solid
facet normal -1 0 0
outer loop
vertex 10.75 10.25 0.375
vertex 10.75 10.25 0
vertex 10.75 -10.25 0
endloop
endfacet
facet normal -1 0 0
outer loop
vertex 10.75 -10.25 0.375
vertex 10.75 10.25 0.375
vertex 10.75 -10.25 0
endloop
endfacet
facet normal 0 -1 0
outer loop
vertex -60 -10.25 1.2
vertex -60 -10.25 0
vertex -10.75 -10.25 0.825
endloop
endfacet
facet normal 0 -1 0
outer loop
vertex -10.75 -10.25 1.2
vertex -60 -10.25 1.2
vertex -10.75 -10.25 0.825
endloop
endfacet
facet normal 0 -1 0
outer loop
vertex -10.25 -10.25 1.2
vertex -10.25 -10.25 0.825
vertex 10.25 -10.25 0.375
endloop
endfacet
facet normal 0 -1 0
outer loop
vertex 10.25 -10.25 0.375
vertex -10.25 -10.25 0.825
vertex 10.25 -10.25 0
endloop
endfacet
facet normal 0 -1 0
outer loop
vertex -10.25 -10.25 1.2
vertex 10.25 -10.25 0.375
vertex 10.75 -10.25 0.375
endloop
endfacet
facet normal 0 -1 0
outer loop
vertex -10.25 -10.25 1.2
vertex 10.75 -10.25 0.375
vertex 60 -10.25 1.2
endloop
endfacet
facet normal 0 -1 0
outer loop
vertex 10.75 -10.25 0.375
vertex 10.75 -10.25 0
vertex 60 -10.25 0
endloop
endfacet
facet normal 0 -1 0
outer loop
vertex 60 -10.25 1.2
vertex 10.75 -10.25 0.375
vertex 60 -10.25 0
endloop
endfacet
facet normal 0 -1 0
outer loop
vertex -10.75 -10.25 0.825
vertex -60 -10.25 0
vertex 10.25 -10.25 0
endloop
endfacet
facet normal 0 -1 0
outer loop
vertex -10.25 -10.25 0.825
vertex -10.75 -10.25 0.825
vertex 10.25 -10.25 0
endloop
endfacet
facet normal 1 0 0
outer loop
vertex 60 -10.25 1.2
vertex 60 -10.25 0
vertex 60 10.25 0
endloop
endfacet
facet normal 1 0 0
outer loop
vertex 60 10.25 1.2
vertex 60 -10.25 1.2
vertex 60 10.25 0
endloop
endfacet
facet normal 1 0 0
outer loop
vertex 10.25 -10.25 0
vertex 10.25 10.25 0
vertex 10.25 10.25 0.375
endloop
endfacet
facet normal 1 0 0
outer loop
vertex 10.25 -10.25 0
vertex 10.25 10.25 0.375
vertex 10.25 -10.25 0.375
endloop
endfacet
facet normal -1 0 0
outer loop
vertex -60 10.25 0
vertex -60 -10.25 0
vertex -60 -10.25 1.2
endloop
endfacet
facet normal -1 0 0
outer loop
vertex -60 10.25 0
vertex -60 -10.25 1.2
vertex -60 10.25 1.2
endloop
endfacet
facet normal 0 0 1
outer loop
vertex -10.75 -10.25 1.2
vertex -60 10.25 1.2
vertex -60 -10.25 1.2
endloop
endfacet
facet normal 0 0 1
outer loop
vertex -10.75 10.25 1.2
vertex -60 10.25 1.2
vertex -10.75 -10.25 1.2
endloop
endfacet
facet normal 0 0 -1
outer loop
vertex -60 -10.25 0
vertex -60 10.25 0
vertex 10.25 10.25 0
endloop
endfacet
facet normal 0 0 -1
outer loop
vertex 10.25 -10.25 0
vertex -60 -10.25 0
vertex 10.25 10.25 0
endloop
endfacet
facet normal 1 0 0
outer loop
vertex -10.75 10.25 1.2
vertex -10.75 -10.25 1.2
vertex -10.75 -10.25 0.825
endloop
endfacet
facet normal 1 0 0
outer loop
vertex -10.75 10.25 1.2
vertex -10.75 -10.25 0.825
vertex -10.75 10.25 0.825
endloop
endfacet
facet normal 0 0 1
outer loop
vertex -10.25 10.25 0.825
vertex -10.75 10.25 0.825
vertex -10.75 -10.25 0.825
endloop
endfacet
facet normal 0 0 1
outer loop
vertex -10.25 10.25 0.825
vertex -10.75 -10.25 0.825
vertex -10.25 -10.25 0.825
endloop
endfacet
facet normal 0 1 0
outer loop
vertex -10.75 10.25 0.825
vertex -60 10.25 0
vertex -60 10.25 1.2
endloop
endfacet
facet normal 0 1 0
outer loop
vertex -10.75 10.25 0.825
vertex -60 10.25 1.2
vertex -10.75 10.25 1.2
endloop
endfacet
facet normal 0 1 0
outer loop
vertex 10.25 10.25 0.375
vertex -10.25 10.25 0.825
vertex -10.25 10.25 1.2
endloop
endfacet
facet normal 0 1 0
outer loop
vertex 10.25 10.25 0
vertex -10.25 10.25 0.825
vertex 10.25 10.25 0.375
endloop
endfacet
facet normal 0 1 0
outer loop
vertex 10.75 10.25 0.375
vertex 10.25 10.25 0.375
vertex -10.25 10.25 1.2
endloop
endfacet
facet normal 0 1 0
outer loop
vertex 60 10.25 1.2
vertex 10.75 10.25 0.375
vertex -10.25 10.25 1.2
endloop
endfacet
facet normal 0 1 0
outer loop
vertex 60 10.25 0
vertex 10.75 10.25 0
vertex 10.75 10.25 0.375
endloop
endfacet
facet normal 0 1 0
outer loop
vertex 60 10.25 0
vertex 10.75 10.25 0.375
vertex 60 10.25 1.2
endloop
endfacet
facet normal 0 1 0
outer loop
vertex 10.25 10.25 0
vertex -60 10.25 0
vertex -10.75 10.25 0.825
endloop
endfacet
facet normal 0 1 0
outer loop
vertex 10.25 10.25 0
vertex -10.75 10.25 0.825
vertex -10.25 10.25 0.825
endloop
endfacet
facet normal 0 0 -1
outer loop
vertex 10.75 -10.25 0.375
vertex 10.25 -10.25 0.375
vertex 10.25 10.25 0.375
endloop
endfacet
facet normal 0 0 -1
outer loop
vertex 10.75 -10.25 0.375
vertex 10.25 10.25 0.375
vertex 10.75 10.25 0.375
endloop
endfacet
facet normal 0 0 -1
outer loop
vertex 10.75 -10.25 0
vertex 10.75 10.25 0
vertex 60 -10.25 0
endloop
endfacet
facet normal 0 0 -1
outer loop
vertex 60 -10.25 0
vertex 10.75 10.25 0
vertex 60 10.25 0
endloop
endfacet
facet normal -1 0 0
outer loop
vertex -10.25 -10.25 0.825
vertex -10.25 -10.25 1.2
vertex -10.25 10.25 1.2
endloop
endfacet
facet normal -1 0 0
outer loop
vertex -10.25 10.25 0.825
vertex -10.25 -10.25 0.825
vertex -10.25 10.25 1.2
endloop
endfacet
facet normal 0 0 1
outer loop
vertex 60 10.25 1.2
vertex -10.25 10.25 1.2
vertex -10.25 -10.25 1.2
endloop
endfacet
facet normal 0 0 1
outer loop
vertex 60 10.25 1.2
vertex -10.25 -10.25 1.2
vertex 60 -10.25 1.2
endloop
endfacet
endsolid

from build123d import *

# Parameters (mm, degrees)
F0_W     = 120
F0_H     = 20.5
F1_DEPTH = 1.2
F2_W     = 0.5
F2_H     = 20.5
F3_DEPTH = 0.375
F4_W     = 0.5
F4_H     = 20.5
F5_DEPTH = 0.375


with BuildPart() as f1:
    # F0 (on Top) → F1 (new body)
    with BuildSketch(Plane.XY):
        Rectangle(F0_W, F0_H)
    extrude(amount=F1_DEPTH)

    # F2 (on face) → F3 (cut)
    with BuildSketch(Plane.XY.offset(1.2)):
        with Locations((-10.5, 0)):
            Rectangle(F2_W, F2_H)
    extrude(amount=-F3_DEPTH, mode=Mode.SUBTRACT)

    # F4 (on face) → F5 (cut)
    with BuildSketch(Plane(origin=(0, 0, 0), x_dir=(1, 0, 0), z_dir=(0, 0, -1))):
        with Locations((10.5, 0)):
            Rectangle(F4_W, F4_H)
    extrude(amount=-F5_DEPTH, mode=Mode.SUBTRACT)


solid = f1.part
